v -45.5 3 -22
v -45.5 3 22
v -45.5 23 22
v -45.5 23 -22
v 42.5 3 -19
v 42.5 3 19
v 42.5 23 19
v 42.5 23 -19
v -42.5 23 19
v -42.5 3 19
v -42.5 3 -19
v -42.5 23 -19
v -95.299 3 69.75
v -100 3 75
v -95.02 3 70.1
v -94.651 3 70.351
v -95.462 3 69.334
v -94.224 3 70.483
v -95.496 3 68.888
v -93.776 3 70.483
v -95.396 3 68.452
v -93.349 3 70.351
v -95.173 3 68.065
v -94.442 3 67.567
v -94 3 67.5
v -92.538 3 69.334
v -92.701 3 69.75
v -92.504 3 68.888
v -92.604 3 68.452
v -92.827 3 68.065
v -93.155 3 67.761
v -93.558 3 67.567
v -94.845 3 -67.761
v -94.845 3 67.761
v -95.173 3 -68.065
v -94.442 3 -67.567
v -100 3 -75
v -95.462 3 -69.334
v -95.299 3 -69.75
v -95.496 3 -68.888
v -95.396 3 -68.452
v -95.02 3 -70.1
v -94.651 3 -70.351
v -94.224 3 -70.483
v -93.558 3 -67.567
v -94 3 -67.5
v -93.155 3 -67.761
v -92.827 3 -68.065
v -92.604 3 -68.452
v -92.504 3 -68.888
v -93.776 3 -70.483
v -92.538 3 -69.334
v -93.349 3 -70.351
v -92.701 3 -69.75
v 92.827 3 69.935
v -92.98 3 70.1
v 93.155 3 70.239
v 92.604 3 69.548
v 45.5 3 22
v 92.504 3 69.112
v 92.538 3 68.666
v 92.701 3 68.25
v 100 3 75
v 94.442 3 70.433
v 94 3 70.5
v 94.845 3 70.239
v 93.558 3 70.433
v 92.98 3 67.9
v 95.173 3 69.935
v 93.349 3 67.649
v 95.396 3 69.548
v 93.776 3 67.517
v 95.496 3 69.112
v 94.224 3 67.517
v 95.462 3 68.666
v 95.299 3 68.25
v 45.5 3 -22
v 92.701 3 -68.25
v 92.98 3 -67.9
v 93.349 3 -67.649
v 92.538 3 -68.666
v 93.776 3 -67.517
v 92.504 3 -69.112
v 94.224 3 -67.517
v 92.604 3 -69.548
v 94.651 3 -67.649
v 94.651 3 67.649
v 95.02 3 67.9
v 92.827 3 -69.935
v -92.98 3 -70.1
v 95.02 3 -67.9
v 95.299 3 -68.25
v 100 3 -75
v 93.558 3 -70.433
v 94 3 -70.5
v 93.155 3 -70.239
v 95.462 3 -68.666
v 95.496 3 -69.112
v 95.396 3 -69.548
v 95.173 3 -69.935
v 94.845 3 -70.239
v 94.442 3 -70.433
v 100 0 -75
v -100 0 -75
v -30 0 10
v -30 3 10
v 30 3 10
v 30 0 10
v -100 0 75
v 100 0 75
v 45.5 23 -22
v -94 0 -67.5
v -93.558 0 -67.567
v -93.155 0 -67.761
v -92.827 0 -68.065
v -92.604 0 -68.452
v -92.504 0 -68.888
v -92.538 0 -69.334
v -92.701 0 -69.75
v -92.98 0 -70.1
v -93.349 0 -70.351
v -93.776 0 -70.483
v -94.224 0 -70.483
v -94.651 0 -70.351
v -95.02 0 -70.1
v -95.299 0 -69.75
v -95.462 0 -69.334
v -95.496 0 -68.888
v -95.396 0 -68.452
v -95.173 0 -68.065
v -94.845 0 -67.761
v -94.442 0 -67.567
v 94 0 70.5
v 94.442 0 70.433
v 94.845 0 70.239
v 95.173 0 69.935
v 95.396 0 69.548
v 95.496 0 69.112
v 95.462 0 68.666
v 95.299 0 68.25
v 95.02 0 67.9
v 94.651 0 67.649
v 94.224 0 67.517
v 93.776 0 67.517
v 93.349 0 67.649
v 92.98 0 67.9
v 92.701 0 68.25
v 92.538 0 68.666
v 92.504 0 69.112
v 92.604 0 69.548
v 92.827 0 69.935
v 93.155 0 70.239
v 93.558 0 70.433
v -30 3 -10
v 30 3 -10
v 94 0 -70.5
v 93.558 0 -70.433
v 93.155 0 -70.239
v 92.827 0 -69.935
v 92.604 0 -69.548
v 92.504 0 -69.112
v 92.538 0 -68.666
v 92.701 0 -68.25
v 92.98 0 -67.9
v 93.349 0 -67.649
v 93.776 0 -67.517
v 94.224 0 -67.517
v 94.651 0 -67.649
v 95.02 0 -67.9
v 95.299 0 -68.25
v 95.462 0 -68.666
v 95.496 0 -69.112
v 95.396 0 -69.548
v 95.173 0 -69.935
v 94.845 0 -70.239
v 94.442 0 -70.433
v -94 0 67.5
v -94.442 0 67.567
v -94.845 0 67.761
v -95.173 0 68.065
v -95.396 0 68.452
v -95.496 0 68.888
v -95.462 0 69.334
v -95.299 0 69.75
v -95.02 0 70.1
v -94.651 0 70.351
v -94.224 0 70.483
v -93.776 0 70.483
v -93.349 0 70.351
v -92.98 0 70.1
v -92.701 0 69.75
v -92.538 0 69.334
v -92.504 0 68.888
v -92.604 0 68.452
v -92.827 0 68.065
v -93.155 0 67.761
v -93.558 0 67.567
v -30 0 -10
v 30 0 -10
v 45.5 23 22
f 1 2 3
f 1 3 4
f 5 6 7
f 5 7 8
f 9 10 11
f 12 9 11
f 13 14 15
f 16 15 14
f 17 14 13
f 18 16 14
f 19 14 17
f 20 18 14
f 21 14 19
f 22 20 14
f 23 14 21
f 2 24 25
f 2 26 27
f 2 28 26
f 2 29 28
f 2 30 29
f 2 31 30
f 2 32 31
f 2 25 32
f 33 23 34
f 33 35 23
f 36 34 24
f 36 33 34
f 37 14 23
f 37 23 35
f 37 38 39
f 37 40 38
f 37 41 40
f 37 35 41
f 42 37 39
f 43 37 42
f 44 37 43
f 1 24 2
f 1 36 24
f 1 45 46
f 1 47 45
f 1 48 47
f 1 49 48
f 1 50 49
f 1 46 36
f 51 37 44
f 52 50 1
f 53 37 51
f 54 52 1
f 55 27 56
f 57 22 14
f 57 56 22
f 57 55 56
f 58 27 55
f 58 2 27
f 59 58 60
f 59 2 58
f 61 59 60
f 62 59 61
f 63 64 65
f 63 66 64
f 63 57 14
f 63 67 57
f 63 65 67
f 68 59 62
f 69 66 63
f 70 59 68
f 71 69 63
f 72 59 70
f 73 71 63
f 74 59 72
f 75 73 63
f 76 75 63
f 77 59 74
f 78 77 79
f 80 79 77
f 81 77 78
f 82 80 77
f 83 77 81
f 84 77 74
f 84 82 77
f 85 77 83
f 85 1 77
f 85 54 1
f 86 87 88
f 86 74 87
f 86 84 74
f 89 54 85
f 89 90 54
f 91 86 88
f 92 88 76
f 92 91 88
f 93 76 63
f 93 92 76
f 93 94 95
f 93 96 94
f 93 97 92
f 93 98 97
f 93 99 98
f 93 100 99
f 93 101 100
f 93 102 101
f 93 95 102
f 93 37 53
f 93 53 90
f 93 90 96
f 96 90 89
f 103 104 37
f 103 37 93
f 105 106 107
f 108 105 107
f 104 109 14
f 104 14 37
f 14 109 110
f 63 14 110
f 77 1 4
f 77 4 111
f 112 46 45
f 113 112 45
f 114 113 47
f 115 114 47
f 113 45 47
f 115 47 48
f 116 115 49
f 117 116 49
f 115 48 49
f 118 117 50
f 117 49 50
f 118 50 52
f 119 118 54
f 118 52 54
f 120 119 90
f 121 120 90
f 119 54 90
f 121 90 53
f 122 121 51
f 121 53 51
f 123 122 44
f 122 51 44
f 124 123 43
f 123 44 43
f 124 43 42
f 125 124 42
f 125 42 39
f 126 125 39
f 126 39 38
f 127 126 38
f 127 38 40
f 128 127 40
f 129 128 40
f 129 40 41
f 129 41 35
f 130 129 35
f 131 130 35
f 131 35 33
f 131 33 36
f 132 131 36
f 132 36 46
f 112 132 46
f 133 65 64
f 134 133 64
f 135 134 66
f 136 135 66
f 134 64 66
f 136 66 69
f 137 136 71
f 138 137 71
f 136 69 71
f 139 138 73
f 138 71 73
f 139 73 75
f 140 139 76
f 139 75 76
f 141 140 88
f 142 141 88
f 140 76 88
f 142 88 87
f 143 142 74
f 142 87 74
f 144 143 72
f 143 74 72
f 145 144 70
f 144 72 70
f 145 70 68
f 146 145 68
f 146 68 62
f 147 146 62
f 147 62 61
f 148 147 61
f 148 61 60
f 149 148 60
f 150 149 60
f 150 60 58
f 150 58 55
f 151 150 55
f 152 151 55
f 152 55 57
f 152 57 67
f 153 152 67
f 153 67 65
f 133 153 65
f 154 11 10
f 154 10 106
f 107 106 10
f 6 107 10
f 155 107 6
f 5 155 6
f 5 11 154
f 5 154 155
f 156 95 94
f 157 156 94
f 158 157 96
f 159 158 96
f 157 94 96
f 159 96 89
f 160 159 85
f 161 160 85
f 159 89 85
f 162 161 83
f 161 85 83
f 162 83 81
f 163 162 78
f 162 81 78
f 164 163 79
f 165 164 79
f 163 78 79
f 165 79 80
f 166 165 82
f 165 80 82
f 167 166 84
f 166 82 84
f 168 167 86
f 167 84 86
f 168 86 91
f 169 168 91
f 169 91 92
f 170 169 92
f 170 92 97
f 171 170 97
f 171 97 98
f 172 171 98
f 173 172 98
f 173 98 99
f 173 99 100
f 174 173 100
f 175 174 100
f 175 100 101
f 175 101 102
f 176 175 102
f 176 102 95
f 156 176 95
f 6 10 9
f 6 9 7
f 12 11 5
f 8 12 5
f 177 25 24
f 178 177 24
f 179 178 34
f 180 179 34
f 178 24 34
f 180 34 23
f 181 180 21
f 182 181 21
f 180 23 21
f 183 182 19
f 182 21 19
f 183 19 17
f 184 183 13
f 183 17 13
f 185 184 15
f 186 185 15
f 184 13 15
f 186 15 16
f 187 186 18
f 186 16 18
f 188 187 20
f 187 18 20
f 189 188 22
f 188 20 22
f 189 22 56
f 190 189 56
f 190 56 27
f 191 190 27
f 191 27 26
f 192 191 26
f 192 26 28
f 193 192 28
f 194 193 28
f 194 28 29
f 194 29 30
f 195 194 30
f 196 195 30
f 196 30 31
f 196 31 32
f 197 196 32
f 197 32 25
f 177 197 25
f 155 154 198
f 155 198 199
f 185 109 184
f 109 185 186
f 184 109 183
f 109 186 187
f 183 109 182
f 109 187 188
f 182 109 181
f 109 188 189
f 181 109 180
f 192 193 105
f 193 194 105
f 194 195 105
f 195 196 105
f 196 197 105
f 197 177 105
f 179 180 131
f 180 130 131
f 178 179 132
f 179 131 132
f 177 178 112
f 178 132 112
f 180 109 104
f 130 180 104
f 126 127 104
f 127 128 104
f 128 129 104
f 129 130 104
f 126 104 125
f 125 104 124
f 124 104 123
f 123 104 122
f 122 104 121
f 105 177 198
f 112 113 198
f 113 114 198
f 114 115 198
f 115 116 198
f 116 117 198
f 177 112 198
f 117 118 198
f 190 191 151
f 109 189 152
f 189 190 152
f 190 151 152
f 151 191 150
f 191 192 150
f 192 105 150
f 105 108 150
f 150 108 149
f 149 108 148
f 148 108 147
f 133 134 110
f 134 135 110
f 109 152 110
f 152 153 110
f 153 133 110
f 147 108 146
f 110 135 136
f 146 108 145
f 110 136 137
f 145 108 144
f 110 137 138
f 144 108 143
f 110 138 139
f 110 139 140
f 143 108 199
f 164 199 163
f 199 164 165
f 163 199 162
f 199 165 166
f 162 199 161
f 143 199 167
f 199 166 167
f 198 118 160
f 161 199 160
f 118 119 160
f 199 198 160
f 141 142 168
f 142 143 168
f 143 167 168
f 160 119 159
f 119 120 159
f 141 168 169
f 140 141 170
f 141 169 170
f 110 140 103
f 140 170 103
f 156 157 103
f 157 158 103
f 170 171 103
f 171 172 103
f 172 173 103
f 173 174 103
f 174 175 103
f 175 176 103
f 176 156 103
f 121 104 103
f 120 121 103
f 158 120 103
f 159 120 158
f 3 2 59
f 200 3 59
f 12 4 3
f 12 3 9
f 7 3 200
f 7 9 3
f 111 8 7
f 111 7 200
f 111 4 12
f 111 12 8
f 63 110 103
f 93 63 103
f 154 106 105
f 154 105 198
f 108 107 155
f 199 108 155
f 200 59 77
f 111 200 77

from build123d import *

# Parameters (mm, degrees)
SKETCH1_W           = 200
SKETCH1_H           = 150
BOSS_EXTRUDE1_DEPTH = 3
SKETCH2_R           = 1.5
CUT_EXTRUDE1_DEPTH  = 126.035994817
SKETCH3_W           = 60
SKETCH3_H           = 20
CUT_EXTRUDE2_DEPTH  = 126.035994817
SKETCH4_W           = 91
SKETCH4_H           = 44
SKETCH4_W_2         = 85
SKETCH4_H_2         = 38
BOSS_EXTRUDE2_DEPTH = 20


with BuildPart() as part:
    # Sketch1 → Boss-Extrude1 (new body)
    with BuildSketch(Plane(origin=(0, 0, 0), x_dir=(1, 0, 0), z_dir=(0, 1, 0))):
        Rectangle(SKETCH1_W, SKETCH1_H)
    extrude(amount=BOSS_EXTRUDE1_DEPTH)

    # Sketch2 → Cut-Extrude1 (cut, through all)
    with BuildSketch(Plane(origin=(0, 3, 0), x_dir=(1, 0, 0), z_dir=(0, 1, 0))):
        with Locations(Location((94, -69, 0), (0, 0, 270))):
            Circle(SKETCH2_R)
        with Locations(Location((94, 69, 0), (0, 0, 90))):
            Circle(SKETCH2_R)
        with Locations(Location((-94, -69, 0), (0, 0, 90))):
            Circle(SKETCH2_R)
        with Locations(Location((-94, 69, 0), (0, 0, 270))):
            Circle(SKETCH2_R)
    extrude(amount=-CUT_EXTRUDE1_DEPTH, mode=Mode.SUBTRACT)

    # Sketch3 → Cut-Extrude2 (cut, through all)
    with BuildSketch(Plane(origin=(0, 3, 0), x_dir=(1, 0, 0), z_dir=(0, 1, 0))):
        Rectangle(SKETCH3_W, SKETCH3_H)
    extrude(amount=-CUT_EXTRUDE2_DEPTH, mode=Mode.SUBTRACT)

    # Sketch4 → Boss-Extrude2 (add)
    with BuildSketch(Plane(origin=(0, 3, 0), x_dir=(1, 0, 0), z_dir=(0, 1, 0))):
        Rectangle(SKETCH4_W, SKETCH4_H)
        Rectangle(SKETCH4_W_2, SKETCH4_H_2, mode=Mode.SUBTRACT)
    extrude(amount=BOSS_EXTRUDE2_DEPTH)


solid = part.part
